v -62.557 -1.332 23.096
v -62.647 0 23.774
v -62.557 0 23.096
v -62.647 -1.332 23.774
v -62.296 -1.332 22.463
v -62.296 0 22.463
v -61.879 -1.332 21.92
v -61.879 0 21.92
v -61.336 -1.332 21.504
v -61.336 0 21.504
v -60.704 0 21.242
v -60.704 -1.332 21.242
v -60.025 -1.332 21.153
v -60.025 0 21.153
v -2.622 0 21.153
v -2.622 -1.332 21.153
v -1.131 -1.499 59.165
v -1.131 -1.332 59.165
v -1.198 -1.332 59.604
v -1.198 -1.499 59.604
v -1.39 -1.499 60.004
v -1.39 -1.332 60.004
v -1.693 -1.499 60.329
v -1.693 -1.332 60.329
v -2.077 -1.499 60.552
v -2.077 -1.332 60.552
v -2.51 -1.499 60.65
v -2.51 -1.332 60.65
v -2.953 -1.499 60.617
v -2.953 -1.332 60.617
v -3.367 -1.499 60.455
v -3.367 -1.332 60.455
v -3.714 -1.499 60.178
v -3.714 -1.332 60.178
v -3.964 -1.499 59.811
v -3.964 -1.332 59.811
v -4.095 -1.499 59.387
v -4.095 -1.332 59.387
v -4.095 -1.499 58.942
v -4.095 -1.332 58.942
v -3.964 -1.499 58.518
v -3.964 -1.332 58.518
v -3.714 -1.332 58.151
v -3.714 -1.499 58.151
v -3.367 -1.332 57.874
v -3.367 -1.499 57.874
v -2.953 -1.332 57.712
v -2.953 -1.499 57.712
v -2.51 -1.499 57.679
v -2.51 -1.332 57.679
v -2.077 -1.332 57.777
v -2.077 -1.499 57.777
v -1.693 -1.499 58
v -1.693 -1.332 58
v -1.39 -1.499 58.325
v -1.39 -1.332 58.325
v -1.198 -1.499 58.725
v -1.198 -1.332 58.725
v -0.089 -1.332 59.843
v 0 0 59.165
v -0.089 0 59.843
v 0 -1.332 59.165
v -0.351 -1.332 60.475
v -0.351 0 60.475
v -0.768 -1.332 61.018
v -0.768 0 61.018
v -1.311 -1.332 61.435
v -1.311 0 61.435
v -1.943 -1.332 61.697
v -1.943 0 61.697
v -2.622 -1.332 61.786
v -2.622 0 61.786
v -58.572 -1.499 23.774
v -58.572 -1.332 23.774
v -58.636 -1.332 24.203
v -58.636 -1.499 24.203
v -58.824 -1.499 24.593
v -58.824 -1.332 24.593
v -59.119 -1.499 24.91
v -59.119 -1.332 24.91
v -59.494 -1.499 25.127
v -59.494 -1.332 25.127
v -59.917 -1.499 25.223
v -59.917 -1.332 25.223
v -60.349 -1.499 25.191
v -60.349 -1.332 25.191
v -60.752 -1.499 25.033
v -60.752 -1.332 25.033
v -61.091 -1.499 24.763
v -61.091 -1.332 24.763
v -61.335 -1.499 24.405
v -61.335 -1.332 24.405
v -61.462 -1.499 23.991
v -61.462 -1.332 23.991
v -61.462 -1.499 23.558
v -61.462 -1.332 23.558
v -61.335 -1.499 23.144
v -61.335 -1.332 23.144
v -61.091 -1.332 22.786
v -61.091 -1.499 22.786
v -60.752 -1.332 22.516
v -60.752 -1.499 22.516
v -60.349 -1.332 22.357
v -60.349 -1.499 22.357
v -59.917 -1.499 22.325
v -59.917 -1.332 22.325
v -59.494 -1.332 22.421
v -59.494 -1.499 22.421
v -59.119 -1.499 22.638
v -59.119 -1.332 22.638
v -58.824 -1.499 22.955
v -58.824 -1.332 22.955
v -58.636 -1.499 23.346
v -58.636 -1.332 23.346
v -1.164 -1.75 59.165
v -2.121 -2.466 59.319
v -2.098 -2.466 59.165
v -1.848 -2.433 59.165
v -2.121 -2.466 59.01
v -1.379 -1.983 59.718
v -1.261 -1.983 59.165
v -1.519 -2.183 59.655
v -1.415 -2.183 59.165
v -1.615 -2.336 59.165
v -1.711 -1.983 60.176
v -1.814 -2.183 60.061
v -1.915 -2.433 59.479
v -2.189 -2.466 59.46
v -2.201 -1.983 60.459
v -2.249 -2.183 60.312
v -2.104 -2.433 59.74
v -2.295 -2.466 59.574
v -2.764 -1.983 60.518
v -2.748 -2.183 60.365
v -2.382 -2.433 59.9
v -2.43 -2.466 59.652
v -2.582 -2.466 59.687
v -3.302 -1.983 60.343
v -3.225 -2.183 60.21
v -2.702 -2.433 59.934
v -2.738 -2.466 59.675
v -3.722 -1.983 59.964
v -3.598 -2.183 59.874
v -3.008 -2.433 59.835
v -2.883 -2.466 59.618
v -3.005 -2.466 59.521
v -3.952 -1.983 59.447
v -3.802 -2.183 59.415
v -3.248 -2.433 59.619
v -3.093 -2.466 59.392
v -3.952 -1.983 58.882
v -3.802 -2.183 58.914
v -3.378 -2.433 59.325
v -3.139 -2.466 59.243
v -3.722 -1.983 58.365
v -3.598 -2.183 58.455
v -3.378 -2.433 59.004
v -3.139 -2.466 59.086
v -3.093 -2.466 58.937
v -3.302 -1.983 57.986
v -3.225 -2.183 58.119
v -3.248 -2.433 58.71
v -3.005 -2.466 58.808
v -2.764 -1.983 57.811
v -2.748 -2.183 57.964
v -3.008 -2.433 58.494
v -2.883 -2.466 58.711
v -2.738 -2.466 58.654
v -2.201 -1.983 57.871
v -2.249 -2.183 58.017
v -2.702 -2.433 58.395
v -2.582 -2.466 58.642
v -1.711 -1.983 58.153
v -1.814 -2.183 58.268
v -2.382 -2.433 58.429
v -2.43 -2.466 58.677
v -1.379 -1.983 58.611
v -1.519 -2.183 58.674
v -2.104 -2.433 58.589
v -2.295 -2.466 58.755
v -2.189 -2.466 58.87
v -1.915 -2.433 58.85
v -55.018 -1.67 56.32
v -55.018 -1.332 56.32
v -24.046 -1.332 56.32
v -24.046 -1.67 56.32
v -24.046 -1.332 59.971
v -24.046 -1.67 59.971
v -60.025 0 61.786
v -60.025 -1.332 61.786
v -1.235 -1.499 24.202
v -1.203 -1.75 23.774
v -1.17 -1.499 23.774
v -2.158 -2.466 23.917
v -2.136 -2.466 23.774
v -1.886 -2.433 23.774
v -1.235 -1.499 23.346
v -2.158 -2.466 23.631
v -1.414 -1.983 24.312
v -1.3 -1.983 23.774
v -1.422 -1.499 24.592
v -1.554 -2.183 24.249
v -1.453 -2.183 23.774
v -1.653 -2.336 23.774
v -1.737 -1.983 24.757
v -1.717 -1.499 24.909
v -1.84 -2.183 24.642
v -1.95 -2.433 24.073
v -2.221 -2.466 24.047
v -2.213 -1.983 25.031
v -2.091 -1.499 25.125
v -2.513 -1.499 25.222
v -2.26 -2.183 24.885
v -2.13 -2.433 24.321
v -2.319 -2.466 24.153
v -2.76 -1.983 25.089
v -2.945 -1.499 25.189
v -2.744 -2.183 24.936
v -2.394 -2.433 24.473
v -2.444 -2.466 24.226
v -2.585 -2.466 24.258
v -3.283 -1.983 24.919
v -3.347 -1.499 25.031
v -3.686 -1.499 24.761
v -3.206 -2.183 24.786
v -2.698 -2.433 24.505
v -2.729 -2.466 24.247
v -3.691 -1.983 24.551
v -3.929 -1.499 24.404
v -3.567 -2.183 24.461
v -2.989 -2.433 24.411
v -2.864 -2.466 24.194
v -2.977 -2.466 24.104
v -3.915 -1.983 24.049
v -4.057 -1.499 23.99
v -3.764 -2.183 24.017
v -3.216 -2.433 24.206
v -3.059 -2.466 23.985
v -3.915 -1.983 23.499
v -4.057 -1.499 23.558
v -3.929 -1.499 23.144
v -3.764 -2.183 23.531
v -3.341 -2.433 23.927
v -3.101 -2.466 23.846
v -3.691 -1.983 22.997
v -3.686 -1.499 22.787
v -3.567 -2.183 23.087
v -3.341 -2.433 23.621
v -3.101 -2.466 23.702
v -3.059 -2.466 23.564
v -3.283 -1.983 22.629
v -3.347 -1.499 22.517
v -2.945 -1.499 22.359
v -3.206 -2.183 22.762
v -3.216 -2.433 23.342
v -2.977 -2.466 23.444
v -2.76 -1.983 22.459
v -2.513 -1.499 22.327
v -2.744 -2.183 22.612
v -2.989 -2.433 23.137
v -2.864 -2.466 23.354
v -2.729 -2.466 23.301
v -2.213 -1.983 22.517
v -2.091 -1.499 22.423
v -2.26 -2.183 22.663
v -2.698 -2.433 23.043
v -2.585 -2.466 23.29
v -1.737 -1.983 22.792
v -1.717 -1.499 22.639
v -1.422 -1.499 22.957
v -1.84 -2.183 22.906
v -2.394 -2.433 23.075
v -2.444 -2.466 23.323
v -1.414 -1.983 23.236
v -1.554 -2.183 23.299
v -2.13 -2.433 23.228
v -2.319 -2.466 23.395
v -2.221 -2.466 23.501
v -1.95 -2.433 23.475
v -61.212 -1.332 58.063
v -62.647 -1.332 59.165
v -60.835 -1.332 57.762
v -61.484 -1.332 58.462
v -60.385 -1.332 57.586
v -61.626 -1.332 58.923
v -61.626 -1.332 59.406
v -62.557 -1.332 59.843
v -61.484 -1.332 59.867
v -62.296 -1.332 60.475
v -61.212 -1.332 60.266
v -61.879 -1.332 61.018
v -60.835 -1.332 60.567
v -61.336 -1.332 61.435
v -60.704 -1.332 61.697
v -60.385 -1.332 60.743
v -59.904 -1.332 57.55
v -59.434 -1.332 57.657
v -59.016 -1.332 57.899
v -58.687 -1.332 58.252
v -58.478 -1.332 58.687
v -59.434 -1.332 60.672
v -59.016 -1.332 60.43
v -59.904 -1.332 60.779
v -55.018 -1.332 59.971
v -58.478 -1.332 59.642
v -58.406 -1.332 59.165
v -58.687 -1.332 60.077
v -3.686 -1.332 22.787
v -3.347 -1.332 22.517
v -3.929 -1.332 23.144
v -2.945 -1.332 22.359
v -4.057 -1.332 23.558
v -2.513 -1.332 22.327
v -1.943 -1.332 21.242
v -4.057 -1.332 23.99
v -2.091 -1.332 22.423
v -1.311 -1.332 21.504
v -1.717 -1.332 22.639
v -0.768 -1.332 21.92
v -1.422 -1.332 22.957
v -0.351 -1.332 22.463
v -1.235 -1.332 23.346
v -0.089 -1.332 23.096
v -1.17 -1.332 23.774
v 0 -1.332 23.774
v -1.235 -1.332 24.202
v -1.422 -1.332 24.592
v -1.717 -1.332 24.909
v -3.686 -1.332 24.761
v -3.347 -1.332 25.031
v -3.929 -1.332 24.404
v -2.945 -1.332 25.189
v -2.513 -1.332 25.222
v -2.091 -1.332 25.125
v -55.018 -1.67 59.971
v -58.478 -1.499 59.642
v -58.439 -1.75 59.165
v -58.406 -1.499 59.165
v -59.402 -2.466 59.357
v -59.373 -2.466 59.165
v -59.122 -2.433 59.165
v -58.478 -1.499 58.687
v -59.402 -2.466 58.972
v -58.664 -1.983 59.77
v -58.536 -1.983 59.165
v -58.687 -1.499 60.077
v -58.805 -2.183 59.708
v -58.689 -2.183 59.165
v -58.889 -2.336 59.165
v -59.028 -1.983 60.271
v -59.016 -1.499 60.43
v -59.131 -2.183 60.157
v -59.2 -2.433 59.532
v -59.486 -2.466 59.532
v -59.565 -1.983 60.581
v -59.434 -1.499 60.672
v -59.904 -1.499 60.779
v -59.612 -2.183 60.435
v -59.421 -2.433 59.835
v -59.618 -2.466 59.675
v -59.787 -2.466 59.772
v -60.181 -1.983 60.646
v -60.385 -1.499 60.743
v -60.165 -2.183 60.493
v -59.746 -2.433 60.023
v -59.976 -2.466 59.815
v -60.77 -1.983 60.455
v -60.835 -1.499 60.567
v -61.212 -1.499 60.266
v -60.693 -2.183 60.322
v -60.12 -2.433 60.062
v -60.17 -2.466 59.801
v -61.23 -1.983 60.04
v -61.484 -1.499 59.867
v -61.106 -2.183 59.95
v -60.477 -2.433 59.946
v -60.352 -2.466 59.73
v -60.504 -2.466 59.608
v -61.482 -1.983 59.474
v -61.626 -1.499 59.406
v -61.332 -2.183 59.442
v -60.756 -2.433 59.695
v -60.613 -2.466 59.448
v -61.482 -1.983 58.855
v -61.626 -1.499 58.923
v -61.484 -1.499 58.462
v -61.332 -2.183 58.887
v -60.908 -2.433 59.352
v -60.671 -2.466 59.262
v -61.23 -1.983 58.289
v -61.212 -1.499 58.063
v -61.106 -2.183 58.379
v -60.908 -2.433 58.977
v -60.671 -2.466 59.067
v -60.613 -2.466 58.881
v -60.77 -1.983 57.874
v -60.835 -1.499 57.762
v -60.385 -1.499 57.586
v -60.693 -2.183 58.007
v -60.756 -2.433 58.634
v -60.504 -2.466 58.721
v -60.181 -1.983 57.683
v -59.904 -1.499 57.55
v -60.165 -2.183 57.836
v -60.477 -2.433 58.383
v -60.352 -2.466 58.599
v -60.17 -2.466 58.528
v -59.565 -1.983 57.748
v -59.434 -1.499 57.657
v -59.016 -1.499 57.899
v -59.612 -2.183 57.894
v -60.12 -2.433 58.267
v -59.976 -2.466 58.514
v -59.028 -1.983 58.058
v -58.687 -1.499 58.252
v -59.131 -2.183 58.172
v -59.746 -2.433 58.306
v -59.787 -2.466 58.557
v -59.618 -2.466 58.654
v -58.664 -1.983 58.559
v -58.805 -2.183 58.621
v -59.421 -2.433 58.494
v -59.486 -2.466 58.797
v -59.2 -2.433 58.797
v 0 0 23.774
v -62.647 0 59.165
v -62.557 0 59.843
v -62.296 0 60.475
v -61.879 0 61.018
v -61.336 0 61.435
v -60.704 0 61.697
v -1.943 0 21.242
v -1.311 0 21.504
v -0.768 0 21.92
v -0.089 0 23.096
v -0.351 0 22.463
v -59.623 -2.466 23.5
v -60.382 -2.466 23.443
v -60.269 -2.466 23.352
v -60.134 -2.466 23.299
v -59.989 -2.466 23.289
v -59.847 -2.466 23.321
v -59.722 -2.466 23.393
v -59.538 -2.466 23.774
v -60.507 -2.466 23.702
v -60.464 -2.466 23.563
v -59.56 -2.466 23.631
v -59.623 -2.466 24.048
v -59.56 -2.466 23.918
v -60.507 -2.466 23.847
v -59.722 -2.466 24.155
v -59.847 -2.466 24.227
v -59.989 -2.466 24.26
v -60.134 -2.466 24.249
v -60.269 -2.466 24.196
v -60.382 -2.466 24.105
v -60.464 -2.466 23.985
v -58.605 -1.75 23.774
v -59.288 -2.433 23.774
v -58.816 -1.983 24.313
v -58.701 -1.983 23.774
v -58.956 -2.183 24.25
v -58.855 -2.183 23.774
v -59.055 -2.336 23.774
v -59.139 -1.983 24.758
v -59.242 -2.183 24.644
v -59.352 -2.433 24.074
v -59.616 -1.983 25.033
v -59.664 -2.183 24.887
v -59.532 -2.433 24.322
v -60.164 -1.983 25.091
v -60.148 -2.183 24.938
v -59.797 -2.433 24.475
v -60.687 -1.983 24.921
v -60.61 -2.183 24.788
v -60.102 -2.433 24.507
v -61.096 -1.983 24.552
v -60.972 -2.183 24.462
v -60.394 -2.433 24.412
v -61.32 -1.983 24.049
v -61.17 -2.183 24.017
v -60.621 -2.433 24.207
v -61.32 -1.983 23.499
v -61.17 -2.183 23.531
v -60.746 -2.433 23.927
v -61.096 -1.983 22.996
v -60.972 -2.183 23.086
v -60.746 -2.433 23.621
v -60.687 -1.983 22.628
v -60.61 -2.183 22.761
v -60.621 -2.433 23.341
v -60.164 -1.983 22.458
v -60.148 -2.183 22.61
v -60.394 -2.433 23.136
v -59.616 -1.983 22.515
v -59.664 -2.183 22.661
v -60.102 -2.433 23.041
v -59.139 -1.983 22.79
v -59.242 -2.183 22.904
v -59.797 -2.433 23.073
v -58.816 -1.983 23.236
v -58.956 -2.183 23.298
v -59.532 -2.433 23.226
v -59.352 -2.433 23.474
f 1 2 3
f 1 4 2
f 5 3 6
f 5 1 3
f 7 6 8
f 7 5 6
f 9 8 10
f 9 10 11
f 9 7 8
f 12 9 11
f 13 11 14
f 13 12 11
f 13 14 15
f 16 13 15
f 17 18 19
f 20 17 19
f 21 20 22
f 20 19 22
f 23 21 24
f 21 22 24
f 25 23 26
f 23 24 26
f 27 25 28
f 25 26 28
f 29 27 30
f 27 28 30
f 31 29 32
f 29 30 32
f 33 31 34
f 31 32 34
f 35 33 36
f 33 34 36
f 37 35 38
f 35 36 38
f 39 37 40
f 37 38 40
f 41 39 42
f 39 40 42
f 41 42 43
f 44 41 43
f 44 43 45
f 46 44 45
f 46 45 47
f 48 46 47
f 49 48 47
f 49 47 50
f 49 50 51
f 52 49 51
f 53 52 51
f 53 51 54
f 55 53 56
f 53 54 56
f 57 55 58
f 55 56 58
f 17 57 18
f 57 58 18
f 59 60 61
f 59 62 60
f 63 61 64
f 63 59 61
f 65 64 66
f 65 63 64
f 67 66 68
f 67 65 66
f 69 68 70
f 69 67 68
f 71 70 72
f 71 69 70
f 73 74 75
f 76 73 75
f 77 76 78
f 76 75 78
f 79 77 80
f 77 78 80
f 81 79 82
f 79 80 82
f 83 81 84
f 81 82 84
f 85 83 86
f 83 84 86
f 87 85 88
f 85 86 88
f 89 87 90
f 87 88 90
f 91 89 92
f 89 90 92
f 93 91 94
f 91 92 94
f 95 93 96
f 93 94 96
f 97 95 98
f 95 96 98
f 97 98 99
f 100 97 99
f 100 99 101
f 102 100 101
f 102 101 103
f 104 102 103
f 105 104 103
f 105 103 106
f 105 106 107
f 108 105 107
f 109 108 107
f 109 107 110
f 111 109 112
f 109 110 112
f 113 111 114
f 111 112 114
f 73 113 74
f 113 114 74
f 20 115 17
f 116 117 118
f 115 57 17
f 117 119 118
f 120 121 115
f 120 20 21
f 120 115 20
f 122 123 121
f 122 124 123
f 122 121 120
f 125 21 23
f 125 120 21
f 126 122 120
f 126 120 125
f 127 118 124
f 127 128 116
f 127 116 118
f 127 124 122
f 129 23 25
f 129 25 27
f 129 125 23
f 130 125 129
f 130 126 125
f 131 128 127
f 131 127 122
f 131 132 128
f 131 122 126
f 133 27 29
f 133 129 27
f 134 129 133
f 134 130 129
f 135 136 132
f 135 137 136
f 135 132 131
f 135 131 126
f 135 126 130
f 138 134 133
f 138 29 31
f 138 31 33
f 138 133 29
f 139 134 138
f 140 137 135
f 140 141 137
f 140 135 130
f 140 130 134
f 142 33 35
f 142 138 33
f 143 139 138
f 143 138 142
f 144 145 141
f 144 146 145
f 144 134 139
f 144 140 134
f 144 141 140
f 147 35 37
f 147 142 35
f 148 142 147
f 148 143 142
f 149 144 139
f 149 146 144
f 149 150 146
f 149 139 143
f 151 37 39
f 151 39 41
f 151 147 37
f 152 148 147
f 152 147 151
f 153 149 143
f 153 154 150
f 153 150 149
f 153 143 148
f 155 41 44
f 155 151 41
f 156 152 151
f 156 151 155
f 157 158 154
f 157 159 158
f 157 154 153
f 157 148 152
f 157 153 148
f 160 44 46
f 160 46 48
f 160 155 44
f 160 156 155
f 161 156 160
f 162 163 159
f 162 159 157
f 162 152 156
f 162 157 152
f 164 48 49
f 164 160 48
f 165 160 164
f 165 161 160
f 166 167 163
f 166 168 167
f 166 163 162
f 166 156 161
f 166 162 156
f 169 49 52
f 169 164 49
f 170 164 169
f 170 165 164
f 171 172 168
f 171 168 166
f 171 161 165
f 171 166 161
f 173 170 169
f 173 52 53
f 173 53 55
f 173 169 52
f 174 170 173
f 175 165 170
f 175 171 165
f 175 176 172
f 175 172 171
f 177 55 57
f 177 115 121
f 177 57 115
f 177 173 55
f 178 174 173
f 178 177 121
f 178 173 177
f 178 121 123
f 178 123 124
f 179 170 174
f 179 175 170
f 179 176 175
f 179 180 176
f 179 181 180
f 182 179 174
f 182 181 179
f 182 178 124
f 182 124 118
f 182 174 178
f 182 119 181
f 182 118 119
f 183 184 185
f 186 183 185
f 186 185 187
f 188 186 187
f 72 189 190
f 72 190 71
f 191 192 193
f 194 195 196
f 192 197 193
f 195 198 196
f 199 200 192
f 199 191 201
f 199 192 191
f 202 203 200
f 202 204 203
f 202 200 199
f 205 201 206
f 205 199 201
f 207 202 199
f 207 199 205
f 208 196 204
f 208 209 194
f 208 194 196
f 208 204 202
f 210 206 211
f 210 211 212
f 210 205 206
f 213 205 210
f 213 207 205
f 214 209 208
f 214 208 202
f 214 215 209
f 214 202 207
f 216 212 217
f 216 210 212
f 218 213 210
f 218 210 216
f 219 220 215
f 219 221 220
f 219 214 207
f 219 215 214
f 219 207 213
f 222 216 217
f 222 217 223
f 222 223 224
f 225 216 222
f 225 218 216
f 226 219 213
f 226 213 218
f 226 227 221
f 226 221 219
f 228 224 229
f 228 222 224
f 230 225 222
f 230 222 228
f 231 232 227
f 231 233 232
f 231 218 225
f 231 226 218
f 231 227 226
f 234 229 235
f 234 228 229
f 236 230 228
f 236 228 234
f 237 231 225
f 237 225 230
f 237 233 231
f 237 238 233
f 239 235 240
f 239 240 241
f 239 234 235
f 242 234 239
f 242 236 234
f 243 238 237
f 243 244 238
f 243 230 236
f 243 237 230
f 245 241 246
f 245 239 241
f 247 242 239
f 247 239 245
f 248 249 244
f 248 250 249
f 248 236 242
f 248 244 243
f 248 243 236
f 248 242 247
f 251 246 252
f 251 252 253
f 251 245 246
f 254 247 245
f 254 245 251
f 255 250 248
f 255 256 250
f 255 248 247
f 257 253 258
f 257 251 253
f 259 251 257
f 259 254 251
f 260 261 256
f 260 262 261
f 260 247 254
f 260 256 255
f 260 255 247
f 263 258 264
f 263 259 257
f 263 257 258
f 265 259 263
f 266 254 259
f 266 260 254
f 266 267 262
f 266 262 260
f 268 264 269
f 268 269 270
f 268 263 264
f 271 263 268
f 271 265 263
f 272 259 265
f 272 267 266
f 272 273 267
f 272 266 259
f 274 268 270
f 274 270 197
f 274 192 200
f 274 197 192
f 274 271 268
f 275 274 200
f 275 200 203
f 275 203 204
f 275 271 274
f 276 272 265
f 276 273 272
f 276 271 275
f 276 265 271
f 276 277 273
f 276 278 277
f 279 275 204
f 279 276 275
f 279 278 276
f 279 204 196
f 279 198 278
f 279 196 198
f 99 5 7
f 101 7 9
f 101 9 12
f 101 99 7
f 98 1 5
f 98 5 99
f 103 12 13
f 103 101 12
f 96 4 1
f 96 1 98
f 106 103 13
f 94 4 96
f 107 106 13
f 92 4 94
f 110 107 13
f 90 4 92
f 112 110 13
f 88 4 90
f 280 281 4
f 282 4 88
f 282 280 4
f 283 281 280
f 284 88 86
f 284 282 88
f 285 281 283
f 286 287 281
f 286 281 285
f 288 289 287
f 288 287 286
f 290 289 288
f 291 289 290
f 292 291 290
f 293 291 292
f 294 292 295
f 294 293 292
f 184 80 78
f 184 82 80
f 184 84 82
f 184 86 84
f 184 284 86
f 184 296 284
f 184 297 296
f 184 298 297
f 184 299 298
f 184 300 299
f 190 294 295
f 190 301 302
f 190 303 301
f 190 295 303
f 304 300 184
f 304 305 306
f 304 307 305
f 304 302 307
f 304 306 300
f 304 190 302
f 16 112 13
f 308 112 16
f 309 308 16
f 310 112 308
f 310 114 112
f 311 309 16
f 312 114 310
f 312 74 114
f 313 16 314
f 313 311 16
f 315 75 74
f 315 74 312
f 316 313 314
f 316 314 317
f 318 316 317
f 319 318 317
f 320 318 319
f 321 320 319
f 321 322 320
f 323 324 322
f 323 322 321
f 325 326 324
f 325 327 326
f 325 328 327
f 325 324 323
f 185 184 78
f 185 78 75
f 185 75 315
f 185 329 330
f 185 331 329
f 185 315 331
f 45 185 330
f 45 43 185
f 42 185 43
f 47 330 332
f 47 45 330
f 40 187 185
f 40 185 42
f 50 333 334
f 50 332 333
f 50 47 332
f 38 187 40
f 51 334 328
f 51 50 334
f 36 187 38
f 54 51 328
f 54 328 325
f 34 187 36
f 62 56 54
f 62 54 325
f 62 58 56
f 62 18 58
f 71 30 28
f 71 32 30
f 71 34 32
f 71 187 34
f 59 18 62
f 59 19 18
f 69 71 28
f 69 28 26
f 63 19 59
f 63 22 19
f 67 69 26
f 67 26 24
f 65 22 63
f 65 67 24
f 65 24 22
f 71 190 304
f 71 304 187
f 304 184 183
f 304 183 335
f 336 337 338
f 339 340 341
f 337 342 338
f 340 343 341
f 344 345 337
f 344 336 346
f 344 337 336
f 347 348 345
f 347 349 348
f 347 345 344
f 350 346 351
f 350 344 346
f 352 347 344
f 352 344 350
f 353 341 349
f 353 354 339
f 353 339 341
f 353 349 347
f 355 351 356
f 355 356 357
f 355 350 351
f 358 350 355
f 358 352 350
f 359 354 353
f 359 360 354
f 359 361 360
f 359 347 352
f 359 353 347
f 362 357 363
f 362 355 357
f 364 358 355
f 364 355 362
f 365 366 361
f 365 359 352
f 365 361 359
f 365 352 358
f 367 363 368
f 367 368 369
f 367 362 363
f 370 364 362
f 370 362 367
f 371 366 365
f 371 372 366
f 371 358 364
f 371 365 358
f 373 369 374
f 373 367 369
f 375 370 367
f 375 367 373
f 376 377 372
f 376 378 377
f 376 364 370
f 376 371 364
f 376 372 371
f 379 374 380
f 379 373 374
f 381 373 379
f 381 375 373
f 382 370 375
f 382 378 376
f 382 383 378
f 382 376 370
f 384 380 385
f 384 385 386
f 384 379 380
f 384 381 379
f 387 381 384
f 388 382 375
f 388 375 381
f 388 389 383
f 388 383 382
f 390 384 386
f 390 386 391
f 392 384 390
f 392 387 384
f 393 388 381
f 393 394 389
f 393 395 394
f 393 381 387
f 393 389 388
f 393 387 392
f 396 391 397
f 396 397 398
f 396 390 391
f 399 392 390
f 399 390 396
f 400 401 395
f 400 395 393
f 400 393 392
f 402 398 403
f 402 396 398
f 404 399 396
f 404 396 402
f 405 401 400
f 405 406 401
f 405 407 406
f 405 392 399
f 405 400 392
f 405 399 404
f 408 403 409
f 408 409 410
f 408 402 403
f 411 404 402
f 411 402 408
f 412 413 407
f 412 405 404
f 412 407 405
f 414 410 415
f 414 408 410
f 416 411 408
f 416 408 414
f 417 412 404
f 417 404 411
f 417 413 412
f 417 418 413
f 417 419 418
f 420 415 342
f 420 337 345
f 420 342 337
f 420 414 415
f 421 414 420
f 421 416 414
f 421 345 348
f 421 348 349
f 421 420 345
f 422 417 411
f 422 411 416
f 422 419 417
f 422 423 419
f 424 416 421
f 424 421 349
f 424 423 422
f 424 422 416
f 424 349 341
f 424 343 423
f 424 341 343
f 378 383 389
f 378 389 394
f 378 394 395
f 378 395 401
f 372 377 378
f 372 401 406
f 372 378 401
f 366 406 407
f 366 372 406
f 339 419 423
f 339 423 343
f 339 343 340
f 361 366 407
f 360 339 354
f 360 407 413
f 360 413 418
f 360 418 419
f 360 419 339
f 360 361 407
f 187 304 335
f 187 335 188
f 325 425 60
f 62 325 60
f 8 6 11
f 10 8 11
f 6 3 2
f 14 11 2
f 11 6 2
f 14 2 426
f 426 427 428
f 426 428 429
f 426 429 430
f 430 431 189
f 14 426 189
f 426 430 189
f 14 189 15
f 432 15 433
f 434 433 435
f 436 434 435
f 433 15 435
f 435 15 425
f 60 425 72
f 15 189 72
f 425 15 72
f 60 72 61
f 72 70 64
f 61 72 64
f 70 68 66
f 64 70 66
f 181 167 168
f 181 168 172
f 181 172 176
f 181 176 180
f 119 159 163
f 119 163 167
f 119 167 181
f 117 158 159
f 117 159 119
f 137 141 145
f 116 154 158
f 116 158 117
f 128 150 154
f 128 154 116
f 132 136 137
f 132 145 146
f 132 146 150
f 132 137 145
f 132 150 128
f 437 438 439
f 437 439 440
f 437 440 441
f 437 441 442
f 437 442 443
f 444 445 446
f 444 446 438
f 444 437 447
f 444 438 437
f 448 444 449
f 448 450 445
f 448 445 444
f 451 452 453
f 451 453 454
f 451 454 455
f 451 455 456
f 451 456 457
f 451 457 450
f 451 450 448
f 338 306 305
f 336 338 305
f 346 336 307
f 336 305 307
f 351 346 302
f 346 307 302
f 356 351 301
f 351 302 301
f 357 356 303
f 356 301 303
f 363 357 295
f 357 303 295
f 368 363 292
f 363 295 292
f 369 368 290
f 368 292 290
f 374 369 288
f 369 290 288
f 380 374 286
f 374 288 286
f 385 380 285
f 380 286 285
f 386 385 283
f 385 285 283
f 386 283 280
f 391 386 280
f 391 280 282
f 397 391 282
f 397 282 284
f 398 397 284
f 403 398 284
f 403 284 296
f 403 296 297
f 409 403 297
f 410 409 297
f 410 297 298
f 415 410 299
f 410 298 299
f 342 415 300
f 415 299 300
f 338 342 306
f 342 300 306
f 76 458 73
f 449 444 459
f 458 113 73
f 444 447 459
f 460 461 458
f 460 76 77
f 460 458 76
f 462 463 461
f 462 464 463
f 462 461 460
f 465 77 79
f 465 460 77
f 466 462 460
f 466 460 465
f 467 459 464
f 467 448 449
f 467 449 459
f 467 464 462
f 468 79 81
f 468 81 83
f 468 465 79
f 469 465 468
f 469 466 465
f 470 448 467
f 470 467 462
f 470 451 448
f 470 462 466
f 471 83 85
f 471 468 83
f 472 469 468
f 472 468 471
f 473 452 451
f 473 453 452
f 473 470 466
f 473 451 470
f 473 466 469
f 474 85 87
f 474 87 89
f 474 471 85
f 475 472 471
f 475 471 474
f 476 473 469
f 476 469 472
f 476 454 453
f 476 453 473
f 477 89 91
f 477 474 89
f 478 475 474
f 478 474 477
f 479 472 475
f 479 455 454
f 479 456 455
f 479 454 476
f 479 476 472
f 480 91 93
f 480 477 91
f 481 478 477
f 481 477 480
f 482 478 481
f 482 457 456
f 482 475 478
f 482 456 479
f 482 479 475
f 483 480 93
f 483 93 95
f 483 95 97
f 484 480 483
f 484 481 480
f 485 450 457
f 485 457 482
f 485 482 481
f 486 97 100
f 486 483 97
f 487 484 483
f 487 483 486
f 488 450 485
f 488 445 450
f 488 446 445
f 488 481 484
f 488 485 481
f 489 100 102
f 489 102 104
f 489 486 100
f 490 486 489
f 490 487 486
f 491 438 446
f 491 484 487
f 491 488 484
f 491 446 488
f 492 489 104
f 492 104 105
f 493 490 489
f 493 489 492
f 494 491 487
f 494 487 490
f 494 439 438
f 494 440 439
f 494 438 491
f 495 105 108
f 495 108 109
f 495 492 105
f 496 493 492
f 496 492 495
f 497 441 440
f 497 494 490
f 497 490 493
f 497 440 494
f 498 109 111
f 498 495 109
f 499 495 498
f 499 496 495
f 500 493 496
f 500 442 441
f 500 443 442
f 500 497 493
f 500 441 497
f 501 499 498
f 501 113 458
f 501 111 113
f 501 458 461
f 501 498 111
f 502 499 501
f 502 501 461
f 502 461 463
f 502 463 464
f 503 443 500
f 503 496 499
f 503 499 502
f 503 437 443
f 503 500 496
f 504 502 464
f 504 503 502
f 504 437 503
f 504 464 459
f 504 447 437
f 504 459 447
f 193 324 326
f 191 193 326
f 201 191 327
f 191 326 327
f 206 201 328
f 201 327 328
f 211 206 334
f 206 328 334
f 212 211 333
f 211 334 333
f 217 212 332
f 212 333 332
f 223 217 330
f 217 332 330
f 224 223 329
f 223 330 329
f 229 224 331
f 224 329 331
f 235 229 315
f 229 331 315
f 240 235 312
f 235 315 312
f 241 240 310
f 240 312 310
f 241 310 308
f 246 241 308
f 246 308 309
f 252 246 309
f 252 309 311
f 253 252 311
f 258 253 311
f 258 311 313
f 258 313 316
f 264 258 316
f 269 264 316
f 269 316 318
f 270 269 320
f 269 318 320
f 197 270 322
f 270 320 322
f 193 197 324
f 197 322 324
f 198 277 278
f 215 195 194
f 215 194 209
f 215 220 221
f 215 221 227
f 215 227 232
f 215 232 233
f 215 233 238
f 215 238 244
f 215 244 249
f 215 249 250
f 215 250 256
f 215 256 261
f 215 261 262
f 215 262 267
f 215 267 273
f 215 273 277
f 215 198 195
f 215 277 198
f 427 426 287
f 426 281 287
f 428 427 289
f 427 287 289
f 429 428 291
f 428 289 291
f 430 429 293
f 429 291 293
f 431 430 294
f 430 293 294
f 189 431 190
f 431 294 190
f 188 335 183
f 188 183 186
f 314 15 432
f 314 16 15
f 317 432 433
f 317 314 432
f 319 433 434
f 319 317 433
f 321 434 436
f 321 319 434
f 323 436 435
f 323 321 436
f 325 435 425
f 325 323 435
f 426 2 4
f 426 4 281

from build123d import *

# Parameters (mm, degrees)
F0_W     = 62.646739
F0_H     = 40.633425
F6_DEPTH = 1.33248
F1_R     = 2.621544
F2_R     = 1.49006
F2_R_2   = 1.453301
F2_R_3   = 1.619057
F2_R_4   = 1.451478
F3_DEPTH = 1.133365
F4_R     = 0.966379
F5_W     = 30.972634
F5_H     = 3.651396
F7_DEPTH = 0.337802


with BuildPart() as f6:
    # F0 (on Front) → F6 (new body)
    with BuildSketch(Plane.XZ):
        with Locations((-31.323369, 41.469335)):
            Rectangle(F0_W, F0_H)
    extrude(amount=F6_DEPTH)

    # F1
    f1_edges = [f6.edges().sort_by_distance(p)[0] for p in [
        (-62.646739, -0.66624, 21.152623),
        (-62.646739, -0.66624, 61.786048),
        (0, -0.66624, 61.786048),
        (0, -0.66624, 21.152623),
    ]]
    fillet(f1_edges, radius=F1_R)

    # F2 (on face) → F3 (join)
    with BuildSketch(Plane.XZ.offset(1.33248)):
        with Locations((-2.621544, 59.164504)):
            Circle(F2_R)
        with Locations((-60.025195, 23.774167)):
            Circle(F2_R_2)
        with Locations((-60.025195, 59.164504)):
            Circle(F2_R_3)
        with Locations((-2.621544, 23.774167)):
            Circle(F2_R_4)
    extrude(amount=F3_DEPTH)

    # F4
    f4_edges = [f6.edges().sort_by_distance(p)[0] for p in [
        (-4.073022, -2.465844, 23.774167),
        (-4.111604, -2.465844, 59.164504),
        (-61.478496, -2.465844, 23.774167),
        (-61.644252, -2.465844, 59.164504),
    ]]
    fillet(f4_edges, radius=F4_R)

    # F5 (on face) → F7 (join)
    with BuildSketch(Plane.XZ.offset(1.33248)):
        with Locations((-39.53187, 58.145337)):
            Rectangle(F5_W, F5_H)
    extrude(amount=F7_DEPTH)


solid = f6.part
